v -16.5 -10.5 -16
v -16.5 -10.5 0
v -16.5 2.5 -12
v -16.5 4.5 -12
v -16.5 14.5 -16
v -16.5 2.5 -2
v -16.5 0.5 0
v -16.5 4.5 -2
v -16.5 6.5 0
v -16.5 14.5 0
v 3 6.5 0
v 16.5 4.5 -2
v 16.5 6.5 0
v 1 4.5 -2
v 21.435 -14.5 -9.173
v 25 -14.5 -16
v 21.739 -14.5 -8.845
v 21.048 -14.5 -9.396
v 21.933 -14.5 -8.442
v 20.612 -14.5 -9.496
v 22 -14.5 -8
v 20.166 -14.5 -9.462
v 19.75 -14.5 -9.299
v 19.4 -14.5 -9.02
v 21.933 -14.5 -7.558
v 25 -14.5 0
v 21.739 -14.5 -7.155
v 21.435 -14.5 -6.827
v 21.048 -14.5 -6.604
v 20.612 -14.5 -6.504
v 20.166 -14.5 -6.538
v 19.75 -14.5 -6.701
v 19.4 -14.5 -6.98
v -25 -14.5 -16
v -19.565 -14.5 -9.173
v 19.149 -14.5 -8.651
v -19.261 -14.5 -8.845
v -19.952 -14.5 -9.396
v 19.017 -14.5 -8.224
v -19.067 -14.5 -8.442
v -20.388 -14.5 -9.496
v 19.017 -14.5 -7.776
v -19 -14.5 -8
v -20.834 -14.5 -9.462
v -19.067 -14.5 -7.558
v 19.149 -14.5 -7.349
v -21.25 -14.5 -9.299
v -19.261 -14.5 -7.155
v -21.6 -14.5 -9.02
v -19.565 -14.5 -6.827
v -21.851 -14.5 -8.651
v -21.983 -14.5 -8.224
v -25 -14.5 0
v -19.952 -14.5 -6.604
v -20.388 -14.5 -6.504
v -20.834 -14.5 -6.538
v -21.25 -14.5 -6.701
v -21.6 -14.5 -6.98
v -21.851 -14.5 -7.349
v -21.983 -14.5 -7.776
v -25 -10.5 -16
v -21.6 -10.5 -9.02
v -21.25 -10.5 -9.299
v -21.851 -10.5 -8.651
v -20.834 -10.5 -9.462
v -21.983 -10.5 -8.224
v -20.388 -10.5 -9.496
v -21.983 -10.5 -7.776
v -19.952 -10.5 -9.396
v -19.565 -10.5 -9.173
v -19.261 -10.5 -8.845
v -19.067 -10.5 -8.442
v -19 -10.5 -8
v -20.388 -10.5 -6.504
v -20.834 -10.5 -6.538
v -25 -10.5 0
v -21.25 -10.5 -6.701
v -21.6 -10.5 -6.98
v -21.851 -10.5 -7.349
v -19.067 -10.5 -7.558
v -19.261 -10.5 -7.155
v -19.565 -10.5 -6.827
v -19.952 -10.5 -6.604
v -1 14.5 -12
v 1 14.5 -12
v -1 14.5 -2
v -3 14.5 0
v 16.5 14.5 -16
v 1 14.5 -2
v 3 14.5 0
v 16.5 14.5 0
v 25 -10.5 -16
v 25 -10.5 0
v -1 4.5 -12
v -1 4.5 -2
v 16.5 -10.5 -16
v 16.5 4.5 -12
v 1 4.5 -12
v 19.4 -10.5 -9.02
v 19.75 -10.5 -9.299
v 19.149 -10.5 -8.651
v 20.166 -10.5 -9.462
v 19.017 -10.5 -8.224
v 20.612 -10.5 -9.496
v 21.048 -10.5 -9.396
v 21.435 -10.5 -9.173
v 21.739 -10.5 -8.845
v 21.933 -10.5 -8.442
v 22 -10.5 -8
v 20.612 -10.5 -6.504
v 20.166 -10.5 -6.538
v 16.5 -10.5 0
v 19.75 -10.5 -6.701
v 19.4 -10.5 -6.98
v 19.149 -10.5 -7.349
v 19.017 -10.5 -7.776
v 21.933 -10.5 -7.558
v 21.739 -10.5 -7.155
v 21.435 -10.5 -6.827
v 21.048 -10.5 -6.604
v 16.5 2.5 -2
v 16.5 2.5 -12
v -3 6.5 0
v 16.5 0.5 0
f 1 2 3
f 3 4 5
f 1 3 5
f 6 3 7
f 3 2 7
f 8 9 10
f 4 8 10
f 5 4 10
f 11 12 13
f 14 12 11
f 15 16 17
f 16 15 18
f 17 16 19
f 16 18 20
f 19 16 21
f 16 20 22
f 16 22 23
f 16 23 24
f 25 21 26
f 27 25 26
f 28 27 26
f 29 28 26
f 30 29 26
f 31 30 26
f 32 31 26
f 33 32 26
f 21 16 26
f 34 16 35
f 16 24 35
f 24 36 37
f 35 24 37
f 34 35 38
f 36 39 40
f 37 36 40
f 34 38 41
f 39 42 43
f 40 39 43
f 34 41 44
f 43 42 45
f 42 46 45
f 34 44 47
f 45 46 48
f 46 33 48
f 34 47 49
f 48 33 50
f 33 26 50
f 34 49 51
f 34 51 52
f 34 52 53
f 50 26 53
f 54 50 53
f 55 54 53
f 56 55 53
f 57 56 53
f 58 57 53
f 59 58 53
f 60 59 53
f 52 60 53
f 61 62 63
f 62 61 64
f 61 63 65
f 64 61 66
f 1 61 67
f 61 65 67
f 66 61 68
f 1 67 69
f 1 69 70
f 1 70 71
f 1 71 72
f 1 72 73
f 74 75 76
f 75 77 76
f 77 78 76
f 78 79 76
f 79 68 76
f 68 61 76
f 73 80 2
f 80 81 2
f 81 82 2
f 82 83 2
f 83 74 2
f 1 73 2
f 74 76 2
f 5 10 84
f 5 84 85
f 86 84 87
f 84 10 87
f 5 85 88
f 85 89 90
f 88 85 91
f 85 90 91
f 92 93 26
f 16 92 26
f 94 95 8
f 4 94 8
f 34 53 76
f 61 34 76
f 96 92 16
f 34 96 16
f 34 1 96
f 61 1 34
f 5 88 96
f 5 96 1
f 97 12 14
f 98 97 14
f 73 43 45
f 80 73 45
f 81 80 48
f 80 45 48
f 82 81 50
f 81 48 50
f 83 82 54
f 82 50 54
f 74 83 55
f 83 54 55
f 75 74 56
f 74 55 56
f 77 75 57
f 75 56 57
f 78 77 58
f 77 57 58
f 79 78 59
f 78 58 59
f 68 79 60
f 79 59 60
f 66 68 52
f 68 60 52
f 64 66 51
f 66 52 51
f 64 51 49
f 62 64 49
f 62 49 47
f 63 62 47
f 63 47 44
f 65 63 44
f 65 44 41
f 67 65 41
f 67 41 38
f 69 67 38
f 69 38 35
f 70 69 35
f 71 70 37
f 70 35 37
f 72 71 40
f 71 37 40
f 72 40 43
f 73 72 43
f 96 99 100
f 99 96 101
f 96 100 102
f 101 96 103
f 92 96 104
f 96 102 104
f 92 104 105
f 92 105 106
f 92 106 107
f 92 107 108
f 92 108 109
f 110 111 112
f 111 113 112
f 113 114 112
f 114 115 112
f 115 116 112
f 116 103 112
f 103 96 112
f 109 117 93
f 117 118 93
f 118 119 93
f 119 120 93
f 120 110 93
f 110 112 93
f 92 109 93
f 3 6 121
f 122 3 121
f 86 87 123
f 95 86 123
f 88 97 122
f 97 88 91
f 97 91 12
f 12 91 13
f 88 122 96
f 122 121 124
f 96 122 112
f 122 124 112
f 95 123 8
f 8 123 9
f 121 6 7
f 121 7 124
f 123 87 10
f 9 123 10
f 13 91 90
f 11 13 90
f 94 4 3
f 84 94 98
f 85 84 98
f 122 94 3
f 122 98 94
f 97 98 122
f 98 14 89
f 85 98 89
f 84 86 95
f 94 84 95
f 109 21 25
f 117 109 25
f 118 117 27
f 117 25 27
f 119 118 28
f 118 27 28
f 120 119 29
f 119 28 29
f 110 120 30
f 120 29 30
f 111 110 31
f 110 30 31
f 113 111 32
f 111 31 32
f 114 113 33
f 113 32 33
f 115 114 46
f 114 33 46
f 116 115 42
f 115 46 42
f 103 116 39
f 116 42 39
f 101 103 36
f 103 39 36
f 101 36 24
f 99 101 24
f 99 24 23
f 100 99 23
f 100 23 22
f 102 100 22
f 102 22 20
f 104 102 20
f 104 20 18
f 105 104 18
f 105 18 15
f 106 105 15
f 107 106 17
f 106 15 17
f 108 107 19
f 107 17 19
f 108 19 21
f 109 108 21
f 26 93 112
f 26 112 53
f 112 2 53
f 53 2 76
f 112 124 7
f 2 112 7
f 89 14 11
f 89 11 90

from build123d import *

# Parameters (mm, degrees)
EXTRUDE1_DEPTH = 16
EXTRUDE6_DEPTH = 12
CHAMFER1_SIZE  = 2
SKETCH3_R      = 1.5
EXTRUDE7_DEPTH = 4


with BuildPart() as part:
    # Sketch1 → Extrude1 (new body)
    with BuildSketch(Plane.XY):
        Polygon((16.5, -10.5), (25, -10.5), (25, -14.5), (-25, -14.5), (-25, -10.5), (-16.5, -10.5), (-16.5, 14.5), (16.5, 14.5), align=None)
    extrude(amount=-EXTRUDE1_DEPTH)

    # Sketch2 → Extrude6 (cut)
    with BuildSketch(Plane.XY):
        Polygon((1, 14.5), (-1, 14.5), (-1, 4.5), (-16.5, 4.5), (-16.5, 2.5), (16.5, 2.5), (16.5, 4.5), (1, 4.5), align=None)
    extrude(amount=-EXTRUDE6_DEPTH, mode=Mode.SUBTRACT)

    # Chamfer1
    chamfer1_edges = [part.edges().sort_by_distance(p)[0] for p in [
        (-1, 9.5, 0),
        (8.75, 4.5, 0),
        (-8.75, 4.5, 0),
        (0, 2.5, 0),
        (1, 9.5, 0),
    ]]
    chamfer(chamfer1_edges, length=CHAMFER1_SIZE)

    # Sketch3 → Extrude7 (cut)
    with BuildSketch(Plane.XZ.offset(14.5)):
        with Locations((-20.5, -8)):
            Circle(SKETCH3_R)
        with Locations((20.5, -8)):
            Circle(SKETCH3_R)
    extrude(amount=-EXTRUDE7_DEPTH, mode=Mode.SUBTRACT)


solid = part.part
